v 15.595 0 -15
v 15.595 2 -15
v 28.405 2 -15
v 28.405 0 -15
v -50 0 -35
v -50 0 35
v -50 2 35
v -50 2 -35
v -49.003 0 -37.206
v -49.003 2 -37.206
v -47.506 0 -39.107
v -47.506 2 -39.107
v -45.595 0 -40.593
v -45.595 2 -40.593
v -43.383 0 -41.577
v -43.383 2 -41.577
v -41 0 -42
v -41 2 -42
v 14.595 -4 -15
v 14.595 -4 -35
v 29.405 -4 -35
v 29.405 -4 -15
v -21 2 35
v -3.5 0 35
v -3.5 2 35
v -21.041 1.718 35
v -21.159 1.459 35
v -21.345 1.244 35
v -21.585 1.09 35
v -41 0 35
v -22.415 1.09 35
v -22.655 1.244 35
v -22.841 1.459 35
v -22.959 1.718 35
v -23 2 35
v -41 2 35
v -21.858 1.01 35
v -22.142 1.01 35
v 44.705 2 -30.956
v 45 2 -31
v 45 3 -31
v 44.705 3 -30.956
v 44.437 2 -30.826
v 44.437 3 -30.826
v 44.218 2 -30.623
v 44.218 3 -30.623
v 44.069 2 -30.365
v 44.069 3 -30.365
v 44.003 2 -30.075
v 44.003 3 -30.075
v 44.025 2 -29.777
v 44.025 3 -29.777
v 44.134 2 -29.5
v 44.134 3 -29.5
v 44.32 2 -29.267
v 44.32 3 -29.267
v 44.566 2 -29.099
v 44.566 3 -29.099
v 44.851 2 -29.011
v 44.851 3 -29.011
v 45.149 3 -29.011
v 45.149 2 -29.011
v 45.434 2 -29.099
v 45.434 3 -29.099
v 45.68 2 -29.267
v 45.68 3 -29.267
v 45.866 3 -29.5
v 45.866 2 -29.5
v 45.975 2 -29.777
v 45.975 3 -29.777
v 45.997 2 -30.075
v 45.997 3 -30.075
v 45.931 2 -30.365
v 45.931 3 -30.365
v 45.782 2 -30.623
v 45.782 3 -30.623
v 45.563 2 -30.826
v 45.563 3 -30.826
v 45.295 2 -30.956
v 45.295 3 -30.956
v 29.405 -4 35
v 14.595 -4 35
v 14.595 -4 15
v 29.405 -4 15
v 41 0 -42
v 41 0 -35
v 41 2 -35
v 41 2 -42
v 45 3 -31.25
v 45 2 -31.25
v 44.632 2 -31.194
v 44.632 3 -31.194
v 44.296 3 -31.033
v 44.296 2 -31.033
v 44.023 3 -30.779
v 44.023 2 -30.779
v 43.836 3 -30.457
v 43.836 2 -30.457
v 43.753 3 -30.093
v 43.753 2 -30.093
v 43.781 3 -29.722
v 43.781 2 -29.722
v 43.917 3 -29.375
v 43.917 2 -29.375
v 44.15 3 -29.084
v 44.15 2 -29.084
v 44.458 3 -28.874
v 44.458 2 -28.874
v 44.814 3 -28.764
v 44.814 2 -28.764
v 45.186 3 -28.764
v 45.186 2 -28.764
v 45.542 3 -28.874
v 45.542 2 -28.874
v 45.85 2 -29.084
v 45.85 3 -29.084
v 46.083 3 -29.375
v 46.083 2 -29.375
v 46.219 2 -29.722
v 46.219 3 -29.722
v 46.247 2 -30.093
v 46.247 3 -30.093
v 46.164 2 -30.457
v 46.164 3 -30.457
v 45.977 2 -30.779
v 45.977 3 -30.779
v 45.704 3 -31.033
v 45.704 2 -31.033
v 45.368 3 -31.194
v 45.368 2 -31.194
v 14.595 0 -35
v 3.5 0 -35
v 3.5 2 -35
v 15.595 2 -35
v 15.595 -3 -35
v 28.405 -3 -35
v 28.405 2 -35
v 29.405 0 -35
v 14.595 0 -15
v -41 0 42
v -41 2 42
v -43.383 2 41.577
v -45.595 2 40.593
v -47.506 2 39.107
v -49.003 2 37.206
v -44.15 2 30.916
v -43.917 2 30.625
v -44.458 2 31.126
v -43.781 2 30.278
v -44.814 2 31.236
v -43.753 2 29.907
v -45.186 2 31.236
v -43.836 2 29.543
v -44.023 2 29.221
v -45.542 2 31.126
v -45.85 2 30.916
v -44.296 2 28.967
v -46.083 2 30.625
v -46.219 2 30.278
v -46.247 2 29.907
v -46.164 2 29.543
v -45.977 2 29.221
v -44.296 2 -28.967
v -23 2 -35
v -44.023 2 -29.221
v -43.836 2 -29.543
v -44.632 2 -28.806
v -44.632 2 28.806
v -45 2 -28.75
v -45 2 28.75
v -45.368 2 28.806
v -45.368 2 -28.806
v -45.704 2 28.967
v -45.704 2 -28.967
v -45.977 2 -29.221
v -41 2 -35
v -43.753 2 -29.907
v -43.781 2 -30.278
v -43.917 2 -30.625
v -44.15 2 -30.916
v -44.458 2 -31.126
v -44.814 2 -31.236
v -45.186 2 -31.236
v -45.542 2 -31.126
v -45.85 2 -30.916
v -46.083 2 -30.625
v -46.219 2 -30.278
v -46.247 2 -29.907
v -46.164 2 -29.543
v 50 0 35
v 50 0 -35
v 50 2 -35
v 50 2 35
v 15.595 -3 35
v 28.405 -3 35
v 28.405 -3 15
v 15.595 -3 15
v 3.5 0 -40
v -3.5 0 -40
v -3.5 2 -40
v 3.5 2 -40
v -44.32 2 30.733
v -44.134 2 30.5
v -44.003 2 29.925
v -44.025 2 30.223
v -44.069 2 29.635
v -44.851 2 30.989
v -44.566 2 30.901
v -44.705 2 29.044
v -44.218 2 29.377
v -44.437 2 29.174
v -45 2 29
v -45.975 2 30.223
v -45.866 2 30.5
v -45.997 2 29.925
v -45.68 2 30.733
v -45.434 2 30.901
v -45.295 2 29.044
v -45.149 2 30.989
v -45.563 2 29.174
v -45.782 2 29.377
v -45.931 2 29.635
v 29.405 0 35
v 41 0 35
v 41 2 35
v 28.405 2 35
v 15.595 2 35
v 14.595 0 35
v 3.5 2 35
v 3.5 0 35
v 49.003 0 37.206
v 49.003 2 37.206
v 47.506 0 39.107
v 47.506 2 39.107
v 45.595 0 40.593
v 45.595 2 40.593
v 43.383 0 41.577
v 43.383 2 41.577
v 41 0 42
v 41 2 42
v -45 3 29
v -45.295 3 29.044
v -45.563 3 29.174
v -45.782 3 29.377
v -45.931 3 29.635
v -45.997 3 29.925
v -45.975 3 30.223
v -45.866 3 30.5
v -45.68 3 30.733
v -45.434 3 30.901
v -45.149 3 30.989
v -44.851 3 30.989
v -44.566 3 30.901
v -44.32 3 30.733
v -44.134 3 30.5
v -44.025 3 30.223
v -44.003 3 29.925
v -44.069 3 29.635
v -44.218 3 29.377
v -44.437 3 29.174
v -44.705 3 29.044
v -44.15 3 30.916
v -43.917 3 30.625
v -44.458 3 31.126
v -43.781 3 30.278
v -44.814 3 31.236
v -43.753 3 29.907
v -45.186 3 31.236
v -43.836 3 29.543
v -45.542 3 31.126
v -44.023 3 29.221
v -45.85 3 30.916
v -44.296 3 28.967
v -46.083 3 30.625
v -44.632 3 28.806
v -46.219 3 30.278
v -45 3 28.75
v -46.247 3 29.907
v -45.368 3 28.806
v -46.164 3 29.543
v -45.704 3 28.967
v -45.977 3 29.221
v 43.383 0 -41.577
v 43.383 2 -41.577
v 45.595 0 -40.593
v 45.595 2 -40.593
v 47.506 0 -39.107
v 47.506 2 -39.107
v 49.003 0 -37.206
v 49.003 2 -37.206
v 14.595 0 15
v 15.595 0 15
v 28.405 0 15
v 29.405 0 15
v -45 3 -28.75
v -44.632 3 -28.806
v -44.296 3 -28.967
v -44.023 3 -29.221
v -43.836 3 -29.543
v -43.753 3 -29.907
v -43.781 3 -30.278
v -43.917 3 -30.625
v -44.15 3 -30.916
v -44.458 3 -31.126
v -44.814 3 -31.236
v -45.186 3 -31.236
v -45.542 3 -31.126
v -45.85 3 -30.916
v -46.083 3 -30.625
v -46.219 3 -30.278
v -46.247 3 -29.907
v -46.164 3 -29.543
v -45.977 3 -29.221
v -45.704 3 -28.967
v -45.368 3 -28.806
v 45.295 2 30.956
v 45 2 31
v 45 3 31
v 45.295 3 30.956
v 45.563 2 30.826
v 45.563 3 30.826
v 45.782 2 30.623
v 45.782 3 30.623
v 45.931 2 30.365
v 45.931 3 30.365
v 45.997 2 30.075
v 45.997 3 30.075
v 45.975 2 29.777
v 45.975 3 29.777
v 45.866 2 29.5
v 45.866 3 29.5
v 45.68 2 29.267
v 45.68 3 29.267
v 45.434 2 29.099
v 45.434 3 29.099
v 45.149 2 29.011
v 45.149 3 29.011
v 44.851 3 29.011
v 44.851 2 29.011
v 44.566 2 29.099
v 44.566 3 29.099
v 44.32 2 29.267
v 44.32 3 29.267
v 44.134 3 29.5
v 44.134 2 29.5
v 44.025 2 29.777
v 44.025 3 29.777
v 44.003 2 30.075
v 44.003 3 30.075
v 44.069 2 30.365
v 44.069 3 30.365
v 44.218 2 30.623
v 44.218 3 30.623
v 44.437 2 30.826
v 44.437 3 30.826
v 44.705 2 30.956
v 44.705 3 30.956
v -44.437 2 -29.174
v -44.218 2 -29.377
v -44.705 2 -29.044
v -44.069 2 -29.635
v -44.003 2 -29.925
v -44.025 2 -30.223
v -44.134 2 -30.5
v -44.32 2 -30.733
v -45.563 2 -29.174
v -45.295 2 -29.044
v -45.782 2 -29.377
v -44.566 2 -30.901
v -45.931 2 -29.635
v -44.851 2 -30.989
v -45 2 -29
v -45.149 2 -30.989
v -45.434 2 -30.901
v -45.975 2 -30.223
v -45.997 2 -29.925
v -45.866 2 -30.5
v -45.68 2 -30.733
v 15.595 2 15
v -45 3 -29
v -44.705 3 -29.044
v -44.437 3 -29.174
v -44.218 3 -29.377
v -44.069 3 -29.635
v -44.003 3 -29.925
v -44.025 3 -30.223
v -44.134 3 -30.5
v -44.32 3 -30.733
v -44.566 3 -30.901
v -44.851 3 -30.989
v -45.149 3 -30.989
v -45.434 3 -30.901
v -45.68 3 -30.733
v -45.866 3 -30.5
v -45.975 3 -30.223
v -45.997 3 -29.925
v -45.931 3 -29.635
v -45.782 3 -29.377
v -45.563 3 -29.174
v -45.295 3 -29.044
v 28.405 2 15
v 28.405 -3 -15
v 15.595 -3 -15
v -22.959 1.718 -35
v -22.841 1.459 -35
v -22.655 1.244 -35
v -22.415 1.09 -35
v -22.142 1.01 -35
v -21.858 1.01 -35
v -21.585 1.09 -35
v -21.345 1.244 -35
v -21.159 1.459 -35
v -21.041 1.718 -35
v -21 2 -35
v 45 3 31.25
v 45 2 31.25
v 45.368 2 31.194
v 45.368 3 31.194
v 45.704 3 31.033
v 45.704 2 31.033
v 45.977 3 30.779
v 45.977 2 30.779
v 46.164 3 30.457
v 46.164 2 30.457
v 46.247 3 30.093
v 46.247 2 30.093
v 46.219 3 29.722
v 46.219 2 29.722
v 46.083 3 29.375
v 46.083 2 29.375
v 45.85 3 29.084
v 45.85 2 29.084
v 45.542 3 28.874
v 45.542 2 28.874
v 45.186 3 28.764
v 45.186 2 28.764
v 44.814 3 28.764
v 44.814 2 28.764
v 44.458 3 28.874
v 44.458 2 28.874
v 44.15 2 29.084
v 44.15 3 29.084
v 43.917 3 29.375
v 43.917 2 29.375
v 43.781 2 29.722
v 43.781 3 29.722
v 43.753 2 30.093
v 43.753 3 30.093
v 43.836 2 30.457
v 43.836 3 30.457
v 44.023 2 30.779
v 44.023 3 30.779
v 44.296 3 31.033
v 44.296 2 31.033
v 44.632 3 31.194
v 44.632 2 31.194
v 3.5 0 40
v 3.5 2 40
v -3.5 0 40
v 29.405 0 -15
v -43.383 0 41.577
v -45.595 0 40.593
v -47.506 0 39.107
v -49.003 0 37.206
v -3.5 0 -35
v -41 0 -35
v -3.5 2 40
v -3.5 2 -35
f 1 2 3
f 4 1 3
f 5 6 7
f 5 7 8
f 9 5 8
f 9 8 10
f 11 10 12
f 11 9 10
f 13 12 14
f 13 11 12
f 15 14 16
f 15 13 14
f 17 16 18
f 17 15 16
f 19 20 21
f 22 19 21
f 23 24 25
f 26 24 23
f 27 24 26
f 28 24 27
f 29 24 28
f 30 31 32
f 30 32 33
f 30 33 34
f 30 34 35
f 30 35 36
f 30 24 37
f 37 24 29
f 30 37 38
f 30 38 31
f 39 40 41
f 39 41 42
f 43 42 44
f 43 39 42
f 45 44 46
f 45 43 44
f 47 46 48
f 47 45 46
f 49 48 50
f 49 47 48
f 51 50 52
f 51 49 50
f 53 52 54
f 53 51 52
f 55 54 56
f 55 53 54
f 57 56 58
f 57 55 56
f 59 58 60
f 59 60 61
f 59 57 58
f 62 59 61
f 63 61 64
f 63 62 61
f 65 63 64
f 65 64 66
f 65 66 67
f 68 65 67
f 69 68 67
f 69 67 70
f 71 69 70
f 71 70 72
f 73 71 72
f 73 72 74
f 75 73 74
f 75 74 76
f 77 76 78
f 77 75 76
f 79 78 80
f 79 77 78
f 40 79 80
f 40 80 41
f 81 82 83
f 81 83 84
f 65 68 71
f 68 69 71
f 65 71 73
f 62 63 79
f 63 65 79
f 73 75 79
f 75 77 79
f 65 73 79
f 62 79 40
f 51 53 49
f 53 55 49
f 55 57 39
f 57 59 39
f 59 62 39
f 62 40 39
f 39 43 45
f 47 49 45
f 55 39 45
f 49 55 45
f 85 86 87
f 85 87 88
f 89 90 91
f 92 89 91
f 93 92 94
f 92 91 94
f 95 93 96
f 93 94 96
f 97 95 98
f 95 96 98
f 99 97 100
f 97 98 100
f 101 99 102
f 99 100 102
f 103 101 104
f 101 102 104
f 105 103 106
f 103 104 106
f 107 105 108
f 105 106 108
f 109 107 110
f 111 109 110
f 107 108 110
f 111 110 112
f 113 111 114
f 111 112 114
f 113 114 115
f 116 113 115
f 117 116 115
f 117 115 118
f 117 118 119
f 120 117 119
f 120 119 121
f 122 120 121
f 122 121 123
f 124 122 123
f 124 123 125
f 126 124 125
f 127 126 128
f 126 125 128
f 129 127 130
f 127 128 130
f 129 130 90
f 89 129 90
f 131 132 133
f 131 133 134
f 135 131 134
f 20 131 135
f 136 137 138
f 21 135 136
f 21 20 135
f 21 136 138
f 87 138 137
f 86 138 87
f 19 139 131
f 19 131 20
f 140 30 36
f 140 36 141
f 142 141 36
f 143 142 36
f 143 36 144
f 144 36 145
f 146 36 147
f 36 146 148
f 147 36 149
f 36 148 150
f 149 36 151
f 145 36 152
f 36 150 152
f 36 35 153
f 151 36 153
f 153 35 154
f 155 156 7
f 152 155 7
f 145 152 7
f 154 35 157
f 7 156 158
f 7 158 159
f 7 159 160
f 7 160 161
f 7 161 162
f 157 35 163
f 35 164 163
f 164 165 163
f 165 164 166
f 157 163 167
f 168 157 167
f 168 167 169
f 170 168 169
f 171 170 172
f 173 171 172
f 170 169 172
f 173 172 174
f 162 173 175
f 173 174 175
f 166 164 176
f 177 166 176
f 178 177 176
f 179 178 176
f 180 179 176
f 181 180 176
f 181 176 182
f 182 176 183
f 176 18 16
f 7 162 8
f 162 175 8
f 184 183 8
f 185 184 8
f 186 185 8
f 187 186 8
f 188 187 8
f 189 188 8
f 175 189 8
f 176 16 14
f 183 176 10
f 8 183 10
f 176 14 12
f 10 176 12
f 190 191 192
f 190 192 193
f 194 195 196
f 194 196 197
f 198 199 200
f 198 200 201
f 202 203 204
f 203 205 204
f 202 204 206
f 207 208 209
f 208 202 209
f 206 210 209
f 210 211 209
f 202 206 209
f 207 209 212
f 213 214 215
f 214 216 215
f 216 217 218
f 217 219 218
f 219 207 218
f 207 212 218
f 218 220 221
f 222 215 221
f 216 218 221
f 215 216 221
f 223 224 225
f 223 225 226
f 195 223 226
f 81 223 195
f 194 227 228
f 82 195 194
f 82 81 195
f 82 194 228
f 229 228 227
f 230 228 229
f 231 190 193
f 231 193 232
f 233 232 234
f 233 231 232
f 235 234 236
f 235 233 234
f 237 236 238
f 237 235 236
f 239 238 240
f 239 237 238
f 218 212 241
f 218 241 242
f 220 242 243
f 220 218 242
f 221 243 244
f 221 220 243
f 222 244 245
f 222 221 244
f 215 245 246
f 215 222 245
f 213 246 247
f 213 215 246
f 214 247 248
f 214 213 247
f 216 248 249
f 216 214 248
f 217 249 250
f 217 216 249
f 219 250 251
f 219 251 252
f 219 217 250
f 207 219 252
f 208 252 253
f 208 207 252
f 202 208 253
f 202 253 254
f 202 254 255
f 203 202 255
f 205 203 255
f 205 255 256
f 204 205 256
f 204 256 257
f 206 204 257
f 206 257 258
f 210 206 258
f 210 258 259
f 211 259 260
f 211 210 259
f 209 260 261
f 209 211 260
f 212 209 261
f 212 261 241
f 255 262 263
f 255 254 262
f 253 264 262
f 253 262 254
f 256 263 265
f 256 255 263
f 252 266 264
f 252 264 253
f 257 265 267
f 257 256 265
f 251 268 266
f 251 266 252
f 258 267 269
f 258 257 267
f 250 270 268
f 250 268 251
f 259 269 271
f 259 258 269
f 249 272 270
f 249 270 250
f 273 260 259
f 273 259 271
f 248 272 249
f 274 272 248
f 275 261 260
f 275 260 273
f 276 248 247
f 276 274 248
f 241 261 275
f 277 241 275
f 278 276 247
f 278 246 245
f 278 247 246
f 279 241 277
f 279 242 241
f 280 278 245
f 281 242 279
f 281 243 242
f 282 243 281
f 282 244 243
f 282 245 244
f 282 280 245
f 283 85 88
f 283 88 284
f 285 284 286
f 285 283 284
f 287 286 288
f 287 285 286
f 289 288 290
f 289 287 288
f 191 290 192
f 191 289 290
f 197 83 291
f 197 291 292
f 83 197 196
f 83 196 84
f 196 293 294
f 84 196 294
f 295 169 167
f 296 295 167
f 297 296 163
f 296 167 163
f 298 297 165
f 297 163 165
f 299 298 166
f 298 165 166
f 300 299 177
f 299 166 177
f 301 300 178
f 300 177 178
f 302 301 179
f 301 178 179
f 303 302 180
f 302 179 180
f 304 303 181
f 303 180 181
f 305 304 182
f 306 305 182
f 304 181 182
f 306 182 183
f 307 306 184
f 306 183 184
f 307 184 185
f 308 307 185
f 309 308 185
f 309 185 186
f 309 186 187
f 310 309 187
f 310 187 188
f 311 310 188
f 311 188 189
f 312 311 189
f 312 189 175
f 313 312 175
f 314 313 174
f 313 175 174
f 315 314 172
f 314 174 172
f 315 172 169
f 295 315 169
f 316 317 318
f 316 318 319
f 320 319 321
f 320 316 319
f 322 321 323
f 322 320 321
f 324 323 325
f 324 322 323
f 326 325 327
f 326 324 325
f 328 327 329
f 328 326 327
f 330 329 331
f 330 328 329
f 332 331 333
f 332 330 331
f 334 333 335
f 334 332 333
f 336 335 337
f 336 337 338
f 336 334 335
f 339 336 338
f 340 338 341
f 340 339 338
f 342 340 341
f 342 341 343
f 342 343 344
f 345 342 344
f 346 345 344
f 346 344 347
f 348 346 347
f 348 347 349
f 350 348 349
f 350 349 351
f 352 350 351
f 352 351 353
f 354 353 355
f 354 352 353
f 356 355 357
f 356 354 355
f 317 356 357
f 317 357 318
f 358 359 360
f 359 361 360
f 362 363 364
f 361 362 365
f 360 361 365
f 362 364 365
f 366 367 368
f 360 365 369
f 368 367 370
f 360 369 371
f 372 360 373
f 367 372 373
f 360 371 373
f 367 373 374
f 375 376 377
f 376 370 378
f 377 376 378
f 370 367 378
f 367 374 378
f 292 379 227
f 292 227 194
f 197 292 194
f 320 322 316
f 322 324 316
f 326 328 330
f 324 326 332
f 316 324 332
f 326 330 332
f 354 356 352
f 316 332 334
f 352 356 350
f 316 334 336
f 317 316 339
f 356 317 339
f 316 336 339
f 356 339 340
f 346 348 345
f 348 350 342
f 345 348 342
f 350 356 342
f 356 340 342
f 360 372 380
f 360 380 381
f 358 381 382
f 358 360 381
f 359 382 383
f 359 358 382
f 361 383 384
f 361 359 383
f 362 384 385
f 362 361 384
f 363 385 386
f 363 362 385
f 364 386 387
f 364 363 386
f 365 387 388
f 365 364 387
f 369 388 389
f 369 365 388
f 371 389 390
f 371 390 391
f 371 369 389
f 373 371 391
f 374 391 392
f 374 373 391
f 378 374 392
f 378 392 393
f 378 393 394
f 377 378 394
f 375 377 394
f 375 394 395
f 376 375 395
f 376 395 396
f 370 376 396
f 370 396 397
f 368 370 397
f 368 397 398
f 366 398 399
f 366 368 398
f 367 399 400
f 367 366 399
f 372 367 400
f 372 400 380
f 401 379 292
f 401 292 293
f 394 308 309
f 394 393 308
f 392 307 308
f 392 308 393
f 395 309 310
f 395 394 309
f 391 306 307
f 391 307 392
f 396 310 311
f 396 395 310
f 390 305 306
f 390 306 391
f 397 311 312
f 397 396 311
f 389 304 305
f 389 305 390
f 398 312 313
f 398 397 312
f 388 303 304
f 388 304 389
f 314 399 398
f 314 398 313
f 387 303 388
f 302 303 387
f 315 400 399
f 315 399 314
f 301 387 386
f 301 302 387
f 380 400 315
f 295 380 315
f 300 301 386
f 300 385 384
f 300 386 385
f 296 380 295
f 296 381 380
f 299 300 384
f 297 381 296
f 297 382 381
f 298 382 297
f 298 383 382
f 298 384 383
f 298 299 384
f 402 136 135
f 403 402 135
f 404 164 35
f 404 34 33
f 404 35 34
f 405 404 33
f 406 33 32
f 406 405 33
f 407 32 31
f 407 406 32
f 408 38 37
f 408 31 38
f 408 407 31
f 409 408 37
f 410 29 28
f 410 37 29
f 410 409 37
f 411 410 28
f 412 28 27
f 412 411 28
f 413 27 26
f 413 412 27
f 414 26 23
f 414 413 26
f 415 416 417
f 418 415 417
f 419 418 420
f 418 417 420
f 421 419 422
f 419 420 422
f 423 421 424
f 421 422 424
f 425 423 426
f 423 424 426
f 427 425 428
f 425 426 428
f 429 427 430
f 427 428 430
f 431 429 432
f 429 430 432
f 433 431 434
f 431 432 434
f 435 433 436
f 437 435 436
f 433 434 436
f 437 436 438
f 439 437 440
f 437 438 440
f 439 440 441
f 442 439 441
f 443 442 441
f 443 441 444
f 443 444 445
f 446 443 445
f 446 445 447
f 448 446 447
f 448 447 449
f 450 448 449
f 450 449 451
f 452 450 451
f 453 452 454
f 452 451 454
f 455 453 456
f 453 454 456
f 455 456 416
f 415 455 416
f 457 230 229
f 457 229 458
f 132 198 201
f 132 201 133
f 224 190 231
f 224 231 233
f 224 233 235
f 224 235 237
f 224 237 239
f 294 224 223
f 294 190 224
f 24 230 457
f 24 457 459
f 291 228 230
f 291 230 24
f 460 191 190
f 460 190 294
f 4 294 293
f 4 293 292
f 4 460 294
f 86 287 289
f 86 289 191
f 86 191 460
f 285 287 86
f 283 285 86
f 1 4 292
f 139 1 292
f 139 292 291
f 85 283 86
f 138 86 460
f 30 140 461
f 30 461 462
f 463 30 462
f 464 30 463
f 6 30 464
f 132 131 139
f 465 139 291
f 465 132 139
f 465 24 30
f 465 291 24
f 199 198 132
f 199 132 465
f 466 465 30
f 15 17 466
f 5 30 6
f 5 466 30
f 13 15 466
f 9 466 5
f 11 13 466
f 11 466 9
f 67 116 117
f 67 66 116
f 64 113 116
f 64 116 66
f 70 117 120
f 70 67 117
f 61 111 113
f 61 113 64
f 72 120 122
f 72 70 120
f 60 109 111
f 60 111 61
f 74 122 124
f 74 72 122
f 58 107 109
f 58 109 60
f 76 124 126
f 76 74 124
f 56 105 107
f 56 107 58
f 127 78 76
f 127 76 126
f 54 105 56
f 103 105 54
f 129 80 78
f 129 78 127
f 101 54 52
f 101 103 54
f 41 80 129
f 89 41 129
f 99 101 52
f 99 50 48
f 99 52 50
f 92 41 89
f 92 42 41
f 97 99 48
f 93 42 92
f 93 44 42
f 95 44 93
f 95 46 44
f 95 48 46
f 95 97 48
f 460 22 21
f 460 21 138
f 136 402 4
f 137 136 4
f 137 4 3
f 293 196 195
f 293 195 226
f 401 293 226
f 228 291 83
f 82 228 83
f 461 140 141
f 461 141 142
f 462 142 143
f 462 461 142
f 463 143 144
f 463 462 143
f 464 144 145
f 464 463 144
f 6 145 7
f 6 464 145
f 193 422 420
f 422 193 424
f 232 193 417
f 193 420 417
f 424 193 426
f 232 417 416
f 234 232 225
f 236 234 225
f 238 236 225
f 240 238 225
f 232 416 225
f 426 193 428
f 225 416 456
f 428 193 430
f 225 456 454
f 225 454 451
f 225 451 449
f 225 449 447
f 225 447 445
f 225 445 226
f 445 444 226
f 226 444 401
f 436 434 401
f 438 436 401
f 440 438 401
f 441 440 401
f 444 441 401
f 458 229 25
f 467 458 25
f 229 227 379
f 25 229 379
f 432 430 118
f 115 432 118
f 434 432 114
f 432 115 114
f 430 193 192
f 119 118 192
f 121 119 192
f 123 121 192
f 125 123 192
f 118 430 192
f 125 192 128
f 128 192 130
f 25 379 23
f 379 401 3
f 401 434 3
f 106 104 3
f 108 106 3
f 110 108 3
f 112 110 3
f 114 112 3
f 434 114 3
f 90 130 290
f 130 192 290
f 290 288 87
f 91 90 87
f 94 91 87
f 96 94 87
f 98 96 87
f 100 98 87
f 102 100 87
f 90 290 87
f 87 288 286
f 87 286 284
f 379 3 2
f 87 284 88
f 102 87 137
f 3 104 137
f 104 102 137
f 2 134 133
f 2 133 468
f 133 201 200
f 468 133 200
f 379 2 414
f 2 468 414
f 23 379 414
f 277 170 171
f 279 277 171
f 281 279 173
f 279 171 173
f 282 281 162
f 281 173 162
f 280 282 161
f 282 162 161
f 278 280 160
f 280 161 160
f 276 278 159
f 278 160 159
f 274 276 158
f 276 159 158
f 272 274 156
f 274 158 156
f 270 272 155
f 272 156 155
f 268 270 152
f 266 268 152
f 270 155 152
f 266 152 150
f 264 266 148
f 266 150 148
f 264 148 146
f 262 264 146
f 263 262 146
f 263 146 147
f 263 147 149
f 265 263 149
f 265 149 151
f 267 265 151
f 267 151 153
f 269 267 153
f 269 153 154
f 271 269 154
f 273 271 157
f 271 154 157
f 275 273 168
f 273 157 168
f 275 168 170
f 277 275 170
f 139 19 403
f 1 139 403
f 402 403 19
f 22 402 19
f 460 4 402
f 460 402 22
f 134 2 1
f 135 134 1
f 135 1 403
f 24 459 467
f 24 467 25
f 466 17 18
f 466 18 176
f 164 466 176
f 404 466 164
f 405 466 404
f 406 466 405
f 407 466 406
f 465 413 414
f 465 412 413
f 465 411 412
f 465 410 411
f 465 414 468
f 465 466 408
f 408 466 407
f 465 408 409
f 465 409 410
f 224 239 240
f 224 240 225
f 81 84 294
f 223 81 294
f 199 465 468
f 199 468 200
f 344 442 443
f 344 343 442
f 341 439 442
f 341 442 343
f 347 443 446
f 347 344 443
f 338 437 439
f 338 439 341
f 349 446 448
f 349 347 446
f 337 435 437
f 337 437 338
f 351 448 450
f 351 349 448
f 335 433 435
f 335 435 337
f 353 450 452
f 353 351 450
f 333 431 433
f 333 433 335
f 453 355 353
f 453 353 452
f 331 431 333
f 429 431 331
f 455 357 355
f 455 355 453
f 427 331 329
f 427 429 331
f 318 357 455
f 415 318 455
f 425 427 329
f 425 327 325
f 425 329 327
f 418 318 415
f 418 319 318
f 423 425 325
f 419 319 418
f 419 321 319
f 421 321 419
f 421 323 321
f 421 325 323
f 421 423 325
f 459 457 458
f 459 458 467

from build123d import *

# Parameters (mm, degrees)
BOSS_EXTRUDE2_DEPTH     = 2
CUT_EXTRUDE4_DEPTH      = 66.329931884
CUT_EXTRUDE4_DEPTH_BACK = 66.329931884
SKETCH4_R               = 1
BOSS_EXTRUDE3_START     = -15
BOSS_EXTRUDE3_DEPTH     = 20
BOSS_EXTRUDE4_START     = -85
BOSS_EXTRUDE4_DEPTH     = 20
CUT_EXTRUDE5_DEPTH      = 1
CUT_EXTRUDE5_DEPTH_BACK = 40
CUT_EXTRUDE5_START      = 5
SKETCH6_4_W             = 12.81
SKETCH6_4_H             = 5
CUT_EXTRUDE6_START      = -65
SKETCH6_6_W             = 12.81
SKETCH6_6_H             = 5
CUT_EXTRUDE6_DEPTH      = 20
SKETCH11_R              = 1.25
SKETCH11_R_2            = 1
BOSS_EXTRUDE6_DEPTH     = 1


with BuildPart() as part:
    # Sketch1 → Boss-Extrude2 (new body)
    with BuildSketch(Plane(origin=(0, 0, 0), x_dir=(1, 0, 0), z_dir=(0, 1, 0))):
        with BuildLine():
            Line((-3.5, 40), (-3.5, 35))
            Line((-3.5, 35), (-41, 35))
            Line((-41, 35), (-41, 42))
            ThreePointArc((-41, 42), (-46.59536929, 39.908331945), (-50, 35))
            Line((-50, 35), (-50, -35))
            ThreePointArc((-50, -35), (-46.59536929, -39.908331945), (-41, -42))
            Line((-41, -42), (-41, -35))
            Line((-41, -35), (-3.5, -35))
            Line((-3.5, -35), (-3.5, -40))
            Line((-3.5, -40), (3.5, -40))
            Line((3.5, -40), (3.5, -35))
            Line((3.5, -35), (41, -35))
            Line((41, -35), (41, -42))
            ThreePointArc((41, -42), (46.59536929, -39.908331945), (50, -35))
            Line((50, -35), (50, 35))
            ThreePointArc((50, 35), (46.59536929, 39.908331945), (41, 42))
            Line((41, 42), (41, 35))
            Line((41, 35), (3.5, 35))
            Line((3.5, 35), (3.5, 40))
            Line((3.5, 40), (-3.5, 40))
        make_face()
    extrude(amount=BOSS_EXTRUDE2_DEPTH)

    # Sketch4 → Cut-Extrude4 (cut, two sides: drawn at the far end of the back side and taken through both)
    with BuildSketch(Plane.XY.offset(-CUT_EXTRUDE4_DEPTH_BACK)):
        with Locations((-22, 2)):
            Circle(SKETCH4_R)
    extrude(amount=CUT_EXTRUDE4_DEPTH + CUT_EXTRUDE4_DEPTH_BACK, mode=Mode.SUBTRACT)

    # Sketch6 → Boss-Extrude3 (add)
    with BuildSketch(Plane.XY.offset(50).offset(BOSS_EXTRUDE3_START)):
        Polygon((15.595, -3), (15.595, 0), (14.595, 0), (14.595, -4), (29.405, -4), (29.405, 0), (28.405, 0), (28.405, -3), align=None)
    extrude(amount=-BOSS_EXTRUDE3_DEPTH)

    # Sketch6<3> → Boss-Extrude4 (add)
    with BuildSketch(Plane.XY.offset(50).offset(BOSS_EXTRUDE4_START)):
        Polygon((15.595, -3), (15.595, 0), (14.595, 0), (14.595, -4), (29.405, -4), (29.405, 0), (28.405, 0), (28.405, -3), align=None)
    extrude(amount=BOSS_EXTRUDE4_DEPTH)

    # Sketch6<4> → Cut-Extrude5 (cut, two sides: drawn at the far end of the back side and taken through both)
    with BuildSketch(Plane.XY.offset(50).offset(CUT_EXTRUDE5_START - CUT_EXTRUDE5_DEPTH_BACK)):
        with Locations((22, -0.5)):
            Rectangle(SKETCH6_4_W, SKETCH6_4_H)
    extrude(amount=CUT_EXTRUDE5_DEPTH + CUT_EXTRUDE5_DEPTH_BACK, mode=Mode.SUBTRACT)

    # Sketch6<6> → Cut-Extrude6 (cut)
    with BuildSketch(Plane.XY.offset(50).offset(CUT_EXTRUDE6_START)):
        with Locations((22, -0.5)):
            Rectangle(SKETCH6_6_W, SKETCH6_6_H)
    extrude(amount=-CUT_EXTRUDE6_DEPTH, mode=Mode.SUBTRACT)

    # Sketch11 → Boss-Extrude6 (add)
    # profile 1 of 4: a face of its own
    with BuildSketch(Plane(origin=(0, 2, 0), x_dir=(1, 0, 0), z_dir=(0, 1, 0))):
        with Locations((-45, 30)):
            Circle(SKETCH11_R)
        with Locations((-45, 30)):
            Circle(SKETCH11_R_2, mode=Mode.SUBTRACT)
    # profile 2 of 4: a face of its own
    with BuildSketch(Plane(origin=(0, 2, 0), x_dir=(1, 0, 0), z_dir=(0, 1, 0))):
        with Locations((45, 30)):
            Circle(SKETCH11_R)
        with Locations((45, 30)):
            Circle(SKETCH11_R_2, mode=Mode.SUBTRACT)
    # profile 3 of 4: a face of its own
    with BuildSketch(Plane(origin=(0, 2, 0), x_dir=(1, 0, 0), z_dir=(0, 1, 0))):
        with Locations((-45, -30)):
            Circle(SKETCH11_R)
        with Locations((-45, -30)):
            Circle(SKETCH11_R_2, mode=Mode.SUBTRACT)
    # profile 4 of 4: a face of its own
    with BuildSketch(Plane(origin=(0, 2, 0), x_dir=(1, 0, 0), z_dir=(0, 1, 0))):
        with Locations((45, -30)):
            Circle(SKETCH11_R)
        with Locations((45, -30)):
            Circle(SKETCH11_R_2, mode=Mode.SUBTRACT)
    extrude(amount=BOSS_EXTRUDE6_DEPTH)


solid = part.part
